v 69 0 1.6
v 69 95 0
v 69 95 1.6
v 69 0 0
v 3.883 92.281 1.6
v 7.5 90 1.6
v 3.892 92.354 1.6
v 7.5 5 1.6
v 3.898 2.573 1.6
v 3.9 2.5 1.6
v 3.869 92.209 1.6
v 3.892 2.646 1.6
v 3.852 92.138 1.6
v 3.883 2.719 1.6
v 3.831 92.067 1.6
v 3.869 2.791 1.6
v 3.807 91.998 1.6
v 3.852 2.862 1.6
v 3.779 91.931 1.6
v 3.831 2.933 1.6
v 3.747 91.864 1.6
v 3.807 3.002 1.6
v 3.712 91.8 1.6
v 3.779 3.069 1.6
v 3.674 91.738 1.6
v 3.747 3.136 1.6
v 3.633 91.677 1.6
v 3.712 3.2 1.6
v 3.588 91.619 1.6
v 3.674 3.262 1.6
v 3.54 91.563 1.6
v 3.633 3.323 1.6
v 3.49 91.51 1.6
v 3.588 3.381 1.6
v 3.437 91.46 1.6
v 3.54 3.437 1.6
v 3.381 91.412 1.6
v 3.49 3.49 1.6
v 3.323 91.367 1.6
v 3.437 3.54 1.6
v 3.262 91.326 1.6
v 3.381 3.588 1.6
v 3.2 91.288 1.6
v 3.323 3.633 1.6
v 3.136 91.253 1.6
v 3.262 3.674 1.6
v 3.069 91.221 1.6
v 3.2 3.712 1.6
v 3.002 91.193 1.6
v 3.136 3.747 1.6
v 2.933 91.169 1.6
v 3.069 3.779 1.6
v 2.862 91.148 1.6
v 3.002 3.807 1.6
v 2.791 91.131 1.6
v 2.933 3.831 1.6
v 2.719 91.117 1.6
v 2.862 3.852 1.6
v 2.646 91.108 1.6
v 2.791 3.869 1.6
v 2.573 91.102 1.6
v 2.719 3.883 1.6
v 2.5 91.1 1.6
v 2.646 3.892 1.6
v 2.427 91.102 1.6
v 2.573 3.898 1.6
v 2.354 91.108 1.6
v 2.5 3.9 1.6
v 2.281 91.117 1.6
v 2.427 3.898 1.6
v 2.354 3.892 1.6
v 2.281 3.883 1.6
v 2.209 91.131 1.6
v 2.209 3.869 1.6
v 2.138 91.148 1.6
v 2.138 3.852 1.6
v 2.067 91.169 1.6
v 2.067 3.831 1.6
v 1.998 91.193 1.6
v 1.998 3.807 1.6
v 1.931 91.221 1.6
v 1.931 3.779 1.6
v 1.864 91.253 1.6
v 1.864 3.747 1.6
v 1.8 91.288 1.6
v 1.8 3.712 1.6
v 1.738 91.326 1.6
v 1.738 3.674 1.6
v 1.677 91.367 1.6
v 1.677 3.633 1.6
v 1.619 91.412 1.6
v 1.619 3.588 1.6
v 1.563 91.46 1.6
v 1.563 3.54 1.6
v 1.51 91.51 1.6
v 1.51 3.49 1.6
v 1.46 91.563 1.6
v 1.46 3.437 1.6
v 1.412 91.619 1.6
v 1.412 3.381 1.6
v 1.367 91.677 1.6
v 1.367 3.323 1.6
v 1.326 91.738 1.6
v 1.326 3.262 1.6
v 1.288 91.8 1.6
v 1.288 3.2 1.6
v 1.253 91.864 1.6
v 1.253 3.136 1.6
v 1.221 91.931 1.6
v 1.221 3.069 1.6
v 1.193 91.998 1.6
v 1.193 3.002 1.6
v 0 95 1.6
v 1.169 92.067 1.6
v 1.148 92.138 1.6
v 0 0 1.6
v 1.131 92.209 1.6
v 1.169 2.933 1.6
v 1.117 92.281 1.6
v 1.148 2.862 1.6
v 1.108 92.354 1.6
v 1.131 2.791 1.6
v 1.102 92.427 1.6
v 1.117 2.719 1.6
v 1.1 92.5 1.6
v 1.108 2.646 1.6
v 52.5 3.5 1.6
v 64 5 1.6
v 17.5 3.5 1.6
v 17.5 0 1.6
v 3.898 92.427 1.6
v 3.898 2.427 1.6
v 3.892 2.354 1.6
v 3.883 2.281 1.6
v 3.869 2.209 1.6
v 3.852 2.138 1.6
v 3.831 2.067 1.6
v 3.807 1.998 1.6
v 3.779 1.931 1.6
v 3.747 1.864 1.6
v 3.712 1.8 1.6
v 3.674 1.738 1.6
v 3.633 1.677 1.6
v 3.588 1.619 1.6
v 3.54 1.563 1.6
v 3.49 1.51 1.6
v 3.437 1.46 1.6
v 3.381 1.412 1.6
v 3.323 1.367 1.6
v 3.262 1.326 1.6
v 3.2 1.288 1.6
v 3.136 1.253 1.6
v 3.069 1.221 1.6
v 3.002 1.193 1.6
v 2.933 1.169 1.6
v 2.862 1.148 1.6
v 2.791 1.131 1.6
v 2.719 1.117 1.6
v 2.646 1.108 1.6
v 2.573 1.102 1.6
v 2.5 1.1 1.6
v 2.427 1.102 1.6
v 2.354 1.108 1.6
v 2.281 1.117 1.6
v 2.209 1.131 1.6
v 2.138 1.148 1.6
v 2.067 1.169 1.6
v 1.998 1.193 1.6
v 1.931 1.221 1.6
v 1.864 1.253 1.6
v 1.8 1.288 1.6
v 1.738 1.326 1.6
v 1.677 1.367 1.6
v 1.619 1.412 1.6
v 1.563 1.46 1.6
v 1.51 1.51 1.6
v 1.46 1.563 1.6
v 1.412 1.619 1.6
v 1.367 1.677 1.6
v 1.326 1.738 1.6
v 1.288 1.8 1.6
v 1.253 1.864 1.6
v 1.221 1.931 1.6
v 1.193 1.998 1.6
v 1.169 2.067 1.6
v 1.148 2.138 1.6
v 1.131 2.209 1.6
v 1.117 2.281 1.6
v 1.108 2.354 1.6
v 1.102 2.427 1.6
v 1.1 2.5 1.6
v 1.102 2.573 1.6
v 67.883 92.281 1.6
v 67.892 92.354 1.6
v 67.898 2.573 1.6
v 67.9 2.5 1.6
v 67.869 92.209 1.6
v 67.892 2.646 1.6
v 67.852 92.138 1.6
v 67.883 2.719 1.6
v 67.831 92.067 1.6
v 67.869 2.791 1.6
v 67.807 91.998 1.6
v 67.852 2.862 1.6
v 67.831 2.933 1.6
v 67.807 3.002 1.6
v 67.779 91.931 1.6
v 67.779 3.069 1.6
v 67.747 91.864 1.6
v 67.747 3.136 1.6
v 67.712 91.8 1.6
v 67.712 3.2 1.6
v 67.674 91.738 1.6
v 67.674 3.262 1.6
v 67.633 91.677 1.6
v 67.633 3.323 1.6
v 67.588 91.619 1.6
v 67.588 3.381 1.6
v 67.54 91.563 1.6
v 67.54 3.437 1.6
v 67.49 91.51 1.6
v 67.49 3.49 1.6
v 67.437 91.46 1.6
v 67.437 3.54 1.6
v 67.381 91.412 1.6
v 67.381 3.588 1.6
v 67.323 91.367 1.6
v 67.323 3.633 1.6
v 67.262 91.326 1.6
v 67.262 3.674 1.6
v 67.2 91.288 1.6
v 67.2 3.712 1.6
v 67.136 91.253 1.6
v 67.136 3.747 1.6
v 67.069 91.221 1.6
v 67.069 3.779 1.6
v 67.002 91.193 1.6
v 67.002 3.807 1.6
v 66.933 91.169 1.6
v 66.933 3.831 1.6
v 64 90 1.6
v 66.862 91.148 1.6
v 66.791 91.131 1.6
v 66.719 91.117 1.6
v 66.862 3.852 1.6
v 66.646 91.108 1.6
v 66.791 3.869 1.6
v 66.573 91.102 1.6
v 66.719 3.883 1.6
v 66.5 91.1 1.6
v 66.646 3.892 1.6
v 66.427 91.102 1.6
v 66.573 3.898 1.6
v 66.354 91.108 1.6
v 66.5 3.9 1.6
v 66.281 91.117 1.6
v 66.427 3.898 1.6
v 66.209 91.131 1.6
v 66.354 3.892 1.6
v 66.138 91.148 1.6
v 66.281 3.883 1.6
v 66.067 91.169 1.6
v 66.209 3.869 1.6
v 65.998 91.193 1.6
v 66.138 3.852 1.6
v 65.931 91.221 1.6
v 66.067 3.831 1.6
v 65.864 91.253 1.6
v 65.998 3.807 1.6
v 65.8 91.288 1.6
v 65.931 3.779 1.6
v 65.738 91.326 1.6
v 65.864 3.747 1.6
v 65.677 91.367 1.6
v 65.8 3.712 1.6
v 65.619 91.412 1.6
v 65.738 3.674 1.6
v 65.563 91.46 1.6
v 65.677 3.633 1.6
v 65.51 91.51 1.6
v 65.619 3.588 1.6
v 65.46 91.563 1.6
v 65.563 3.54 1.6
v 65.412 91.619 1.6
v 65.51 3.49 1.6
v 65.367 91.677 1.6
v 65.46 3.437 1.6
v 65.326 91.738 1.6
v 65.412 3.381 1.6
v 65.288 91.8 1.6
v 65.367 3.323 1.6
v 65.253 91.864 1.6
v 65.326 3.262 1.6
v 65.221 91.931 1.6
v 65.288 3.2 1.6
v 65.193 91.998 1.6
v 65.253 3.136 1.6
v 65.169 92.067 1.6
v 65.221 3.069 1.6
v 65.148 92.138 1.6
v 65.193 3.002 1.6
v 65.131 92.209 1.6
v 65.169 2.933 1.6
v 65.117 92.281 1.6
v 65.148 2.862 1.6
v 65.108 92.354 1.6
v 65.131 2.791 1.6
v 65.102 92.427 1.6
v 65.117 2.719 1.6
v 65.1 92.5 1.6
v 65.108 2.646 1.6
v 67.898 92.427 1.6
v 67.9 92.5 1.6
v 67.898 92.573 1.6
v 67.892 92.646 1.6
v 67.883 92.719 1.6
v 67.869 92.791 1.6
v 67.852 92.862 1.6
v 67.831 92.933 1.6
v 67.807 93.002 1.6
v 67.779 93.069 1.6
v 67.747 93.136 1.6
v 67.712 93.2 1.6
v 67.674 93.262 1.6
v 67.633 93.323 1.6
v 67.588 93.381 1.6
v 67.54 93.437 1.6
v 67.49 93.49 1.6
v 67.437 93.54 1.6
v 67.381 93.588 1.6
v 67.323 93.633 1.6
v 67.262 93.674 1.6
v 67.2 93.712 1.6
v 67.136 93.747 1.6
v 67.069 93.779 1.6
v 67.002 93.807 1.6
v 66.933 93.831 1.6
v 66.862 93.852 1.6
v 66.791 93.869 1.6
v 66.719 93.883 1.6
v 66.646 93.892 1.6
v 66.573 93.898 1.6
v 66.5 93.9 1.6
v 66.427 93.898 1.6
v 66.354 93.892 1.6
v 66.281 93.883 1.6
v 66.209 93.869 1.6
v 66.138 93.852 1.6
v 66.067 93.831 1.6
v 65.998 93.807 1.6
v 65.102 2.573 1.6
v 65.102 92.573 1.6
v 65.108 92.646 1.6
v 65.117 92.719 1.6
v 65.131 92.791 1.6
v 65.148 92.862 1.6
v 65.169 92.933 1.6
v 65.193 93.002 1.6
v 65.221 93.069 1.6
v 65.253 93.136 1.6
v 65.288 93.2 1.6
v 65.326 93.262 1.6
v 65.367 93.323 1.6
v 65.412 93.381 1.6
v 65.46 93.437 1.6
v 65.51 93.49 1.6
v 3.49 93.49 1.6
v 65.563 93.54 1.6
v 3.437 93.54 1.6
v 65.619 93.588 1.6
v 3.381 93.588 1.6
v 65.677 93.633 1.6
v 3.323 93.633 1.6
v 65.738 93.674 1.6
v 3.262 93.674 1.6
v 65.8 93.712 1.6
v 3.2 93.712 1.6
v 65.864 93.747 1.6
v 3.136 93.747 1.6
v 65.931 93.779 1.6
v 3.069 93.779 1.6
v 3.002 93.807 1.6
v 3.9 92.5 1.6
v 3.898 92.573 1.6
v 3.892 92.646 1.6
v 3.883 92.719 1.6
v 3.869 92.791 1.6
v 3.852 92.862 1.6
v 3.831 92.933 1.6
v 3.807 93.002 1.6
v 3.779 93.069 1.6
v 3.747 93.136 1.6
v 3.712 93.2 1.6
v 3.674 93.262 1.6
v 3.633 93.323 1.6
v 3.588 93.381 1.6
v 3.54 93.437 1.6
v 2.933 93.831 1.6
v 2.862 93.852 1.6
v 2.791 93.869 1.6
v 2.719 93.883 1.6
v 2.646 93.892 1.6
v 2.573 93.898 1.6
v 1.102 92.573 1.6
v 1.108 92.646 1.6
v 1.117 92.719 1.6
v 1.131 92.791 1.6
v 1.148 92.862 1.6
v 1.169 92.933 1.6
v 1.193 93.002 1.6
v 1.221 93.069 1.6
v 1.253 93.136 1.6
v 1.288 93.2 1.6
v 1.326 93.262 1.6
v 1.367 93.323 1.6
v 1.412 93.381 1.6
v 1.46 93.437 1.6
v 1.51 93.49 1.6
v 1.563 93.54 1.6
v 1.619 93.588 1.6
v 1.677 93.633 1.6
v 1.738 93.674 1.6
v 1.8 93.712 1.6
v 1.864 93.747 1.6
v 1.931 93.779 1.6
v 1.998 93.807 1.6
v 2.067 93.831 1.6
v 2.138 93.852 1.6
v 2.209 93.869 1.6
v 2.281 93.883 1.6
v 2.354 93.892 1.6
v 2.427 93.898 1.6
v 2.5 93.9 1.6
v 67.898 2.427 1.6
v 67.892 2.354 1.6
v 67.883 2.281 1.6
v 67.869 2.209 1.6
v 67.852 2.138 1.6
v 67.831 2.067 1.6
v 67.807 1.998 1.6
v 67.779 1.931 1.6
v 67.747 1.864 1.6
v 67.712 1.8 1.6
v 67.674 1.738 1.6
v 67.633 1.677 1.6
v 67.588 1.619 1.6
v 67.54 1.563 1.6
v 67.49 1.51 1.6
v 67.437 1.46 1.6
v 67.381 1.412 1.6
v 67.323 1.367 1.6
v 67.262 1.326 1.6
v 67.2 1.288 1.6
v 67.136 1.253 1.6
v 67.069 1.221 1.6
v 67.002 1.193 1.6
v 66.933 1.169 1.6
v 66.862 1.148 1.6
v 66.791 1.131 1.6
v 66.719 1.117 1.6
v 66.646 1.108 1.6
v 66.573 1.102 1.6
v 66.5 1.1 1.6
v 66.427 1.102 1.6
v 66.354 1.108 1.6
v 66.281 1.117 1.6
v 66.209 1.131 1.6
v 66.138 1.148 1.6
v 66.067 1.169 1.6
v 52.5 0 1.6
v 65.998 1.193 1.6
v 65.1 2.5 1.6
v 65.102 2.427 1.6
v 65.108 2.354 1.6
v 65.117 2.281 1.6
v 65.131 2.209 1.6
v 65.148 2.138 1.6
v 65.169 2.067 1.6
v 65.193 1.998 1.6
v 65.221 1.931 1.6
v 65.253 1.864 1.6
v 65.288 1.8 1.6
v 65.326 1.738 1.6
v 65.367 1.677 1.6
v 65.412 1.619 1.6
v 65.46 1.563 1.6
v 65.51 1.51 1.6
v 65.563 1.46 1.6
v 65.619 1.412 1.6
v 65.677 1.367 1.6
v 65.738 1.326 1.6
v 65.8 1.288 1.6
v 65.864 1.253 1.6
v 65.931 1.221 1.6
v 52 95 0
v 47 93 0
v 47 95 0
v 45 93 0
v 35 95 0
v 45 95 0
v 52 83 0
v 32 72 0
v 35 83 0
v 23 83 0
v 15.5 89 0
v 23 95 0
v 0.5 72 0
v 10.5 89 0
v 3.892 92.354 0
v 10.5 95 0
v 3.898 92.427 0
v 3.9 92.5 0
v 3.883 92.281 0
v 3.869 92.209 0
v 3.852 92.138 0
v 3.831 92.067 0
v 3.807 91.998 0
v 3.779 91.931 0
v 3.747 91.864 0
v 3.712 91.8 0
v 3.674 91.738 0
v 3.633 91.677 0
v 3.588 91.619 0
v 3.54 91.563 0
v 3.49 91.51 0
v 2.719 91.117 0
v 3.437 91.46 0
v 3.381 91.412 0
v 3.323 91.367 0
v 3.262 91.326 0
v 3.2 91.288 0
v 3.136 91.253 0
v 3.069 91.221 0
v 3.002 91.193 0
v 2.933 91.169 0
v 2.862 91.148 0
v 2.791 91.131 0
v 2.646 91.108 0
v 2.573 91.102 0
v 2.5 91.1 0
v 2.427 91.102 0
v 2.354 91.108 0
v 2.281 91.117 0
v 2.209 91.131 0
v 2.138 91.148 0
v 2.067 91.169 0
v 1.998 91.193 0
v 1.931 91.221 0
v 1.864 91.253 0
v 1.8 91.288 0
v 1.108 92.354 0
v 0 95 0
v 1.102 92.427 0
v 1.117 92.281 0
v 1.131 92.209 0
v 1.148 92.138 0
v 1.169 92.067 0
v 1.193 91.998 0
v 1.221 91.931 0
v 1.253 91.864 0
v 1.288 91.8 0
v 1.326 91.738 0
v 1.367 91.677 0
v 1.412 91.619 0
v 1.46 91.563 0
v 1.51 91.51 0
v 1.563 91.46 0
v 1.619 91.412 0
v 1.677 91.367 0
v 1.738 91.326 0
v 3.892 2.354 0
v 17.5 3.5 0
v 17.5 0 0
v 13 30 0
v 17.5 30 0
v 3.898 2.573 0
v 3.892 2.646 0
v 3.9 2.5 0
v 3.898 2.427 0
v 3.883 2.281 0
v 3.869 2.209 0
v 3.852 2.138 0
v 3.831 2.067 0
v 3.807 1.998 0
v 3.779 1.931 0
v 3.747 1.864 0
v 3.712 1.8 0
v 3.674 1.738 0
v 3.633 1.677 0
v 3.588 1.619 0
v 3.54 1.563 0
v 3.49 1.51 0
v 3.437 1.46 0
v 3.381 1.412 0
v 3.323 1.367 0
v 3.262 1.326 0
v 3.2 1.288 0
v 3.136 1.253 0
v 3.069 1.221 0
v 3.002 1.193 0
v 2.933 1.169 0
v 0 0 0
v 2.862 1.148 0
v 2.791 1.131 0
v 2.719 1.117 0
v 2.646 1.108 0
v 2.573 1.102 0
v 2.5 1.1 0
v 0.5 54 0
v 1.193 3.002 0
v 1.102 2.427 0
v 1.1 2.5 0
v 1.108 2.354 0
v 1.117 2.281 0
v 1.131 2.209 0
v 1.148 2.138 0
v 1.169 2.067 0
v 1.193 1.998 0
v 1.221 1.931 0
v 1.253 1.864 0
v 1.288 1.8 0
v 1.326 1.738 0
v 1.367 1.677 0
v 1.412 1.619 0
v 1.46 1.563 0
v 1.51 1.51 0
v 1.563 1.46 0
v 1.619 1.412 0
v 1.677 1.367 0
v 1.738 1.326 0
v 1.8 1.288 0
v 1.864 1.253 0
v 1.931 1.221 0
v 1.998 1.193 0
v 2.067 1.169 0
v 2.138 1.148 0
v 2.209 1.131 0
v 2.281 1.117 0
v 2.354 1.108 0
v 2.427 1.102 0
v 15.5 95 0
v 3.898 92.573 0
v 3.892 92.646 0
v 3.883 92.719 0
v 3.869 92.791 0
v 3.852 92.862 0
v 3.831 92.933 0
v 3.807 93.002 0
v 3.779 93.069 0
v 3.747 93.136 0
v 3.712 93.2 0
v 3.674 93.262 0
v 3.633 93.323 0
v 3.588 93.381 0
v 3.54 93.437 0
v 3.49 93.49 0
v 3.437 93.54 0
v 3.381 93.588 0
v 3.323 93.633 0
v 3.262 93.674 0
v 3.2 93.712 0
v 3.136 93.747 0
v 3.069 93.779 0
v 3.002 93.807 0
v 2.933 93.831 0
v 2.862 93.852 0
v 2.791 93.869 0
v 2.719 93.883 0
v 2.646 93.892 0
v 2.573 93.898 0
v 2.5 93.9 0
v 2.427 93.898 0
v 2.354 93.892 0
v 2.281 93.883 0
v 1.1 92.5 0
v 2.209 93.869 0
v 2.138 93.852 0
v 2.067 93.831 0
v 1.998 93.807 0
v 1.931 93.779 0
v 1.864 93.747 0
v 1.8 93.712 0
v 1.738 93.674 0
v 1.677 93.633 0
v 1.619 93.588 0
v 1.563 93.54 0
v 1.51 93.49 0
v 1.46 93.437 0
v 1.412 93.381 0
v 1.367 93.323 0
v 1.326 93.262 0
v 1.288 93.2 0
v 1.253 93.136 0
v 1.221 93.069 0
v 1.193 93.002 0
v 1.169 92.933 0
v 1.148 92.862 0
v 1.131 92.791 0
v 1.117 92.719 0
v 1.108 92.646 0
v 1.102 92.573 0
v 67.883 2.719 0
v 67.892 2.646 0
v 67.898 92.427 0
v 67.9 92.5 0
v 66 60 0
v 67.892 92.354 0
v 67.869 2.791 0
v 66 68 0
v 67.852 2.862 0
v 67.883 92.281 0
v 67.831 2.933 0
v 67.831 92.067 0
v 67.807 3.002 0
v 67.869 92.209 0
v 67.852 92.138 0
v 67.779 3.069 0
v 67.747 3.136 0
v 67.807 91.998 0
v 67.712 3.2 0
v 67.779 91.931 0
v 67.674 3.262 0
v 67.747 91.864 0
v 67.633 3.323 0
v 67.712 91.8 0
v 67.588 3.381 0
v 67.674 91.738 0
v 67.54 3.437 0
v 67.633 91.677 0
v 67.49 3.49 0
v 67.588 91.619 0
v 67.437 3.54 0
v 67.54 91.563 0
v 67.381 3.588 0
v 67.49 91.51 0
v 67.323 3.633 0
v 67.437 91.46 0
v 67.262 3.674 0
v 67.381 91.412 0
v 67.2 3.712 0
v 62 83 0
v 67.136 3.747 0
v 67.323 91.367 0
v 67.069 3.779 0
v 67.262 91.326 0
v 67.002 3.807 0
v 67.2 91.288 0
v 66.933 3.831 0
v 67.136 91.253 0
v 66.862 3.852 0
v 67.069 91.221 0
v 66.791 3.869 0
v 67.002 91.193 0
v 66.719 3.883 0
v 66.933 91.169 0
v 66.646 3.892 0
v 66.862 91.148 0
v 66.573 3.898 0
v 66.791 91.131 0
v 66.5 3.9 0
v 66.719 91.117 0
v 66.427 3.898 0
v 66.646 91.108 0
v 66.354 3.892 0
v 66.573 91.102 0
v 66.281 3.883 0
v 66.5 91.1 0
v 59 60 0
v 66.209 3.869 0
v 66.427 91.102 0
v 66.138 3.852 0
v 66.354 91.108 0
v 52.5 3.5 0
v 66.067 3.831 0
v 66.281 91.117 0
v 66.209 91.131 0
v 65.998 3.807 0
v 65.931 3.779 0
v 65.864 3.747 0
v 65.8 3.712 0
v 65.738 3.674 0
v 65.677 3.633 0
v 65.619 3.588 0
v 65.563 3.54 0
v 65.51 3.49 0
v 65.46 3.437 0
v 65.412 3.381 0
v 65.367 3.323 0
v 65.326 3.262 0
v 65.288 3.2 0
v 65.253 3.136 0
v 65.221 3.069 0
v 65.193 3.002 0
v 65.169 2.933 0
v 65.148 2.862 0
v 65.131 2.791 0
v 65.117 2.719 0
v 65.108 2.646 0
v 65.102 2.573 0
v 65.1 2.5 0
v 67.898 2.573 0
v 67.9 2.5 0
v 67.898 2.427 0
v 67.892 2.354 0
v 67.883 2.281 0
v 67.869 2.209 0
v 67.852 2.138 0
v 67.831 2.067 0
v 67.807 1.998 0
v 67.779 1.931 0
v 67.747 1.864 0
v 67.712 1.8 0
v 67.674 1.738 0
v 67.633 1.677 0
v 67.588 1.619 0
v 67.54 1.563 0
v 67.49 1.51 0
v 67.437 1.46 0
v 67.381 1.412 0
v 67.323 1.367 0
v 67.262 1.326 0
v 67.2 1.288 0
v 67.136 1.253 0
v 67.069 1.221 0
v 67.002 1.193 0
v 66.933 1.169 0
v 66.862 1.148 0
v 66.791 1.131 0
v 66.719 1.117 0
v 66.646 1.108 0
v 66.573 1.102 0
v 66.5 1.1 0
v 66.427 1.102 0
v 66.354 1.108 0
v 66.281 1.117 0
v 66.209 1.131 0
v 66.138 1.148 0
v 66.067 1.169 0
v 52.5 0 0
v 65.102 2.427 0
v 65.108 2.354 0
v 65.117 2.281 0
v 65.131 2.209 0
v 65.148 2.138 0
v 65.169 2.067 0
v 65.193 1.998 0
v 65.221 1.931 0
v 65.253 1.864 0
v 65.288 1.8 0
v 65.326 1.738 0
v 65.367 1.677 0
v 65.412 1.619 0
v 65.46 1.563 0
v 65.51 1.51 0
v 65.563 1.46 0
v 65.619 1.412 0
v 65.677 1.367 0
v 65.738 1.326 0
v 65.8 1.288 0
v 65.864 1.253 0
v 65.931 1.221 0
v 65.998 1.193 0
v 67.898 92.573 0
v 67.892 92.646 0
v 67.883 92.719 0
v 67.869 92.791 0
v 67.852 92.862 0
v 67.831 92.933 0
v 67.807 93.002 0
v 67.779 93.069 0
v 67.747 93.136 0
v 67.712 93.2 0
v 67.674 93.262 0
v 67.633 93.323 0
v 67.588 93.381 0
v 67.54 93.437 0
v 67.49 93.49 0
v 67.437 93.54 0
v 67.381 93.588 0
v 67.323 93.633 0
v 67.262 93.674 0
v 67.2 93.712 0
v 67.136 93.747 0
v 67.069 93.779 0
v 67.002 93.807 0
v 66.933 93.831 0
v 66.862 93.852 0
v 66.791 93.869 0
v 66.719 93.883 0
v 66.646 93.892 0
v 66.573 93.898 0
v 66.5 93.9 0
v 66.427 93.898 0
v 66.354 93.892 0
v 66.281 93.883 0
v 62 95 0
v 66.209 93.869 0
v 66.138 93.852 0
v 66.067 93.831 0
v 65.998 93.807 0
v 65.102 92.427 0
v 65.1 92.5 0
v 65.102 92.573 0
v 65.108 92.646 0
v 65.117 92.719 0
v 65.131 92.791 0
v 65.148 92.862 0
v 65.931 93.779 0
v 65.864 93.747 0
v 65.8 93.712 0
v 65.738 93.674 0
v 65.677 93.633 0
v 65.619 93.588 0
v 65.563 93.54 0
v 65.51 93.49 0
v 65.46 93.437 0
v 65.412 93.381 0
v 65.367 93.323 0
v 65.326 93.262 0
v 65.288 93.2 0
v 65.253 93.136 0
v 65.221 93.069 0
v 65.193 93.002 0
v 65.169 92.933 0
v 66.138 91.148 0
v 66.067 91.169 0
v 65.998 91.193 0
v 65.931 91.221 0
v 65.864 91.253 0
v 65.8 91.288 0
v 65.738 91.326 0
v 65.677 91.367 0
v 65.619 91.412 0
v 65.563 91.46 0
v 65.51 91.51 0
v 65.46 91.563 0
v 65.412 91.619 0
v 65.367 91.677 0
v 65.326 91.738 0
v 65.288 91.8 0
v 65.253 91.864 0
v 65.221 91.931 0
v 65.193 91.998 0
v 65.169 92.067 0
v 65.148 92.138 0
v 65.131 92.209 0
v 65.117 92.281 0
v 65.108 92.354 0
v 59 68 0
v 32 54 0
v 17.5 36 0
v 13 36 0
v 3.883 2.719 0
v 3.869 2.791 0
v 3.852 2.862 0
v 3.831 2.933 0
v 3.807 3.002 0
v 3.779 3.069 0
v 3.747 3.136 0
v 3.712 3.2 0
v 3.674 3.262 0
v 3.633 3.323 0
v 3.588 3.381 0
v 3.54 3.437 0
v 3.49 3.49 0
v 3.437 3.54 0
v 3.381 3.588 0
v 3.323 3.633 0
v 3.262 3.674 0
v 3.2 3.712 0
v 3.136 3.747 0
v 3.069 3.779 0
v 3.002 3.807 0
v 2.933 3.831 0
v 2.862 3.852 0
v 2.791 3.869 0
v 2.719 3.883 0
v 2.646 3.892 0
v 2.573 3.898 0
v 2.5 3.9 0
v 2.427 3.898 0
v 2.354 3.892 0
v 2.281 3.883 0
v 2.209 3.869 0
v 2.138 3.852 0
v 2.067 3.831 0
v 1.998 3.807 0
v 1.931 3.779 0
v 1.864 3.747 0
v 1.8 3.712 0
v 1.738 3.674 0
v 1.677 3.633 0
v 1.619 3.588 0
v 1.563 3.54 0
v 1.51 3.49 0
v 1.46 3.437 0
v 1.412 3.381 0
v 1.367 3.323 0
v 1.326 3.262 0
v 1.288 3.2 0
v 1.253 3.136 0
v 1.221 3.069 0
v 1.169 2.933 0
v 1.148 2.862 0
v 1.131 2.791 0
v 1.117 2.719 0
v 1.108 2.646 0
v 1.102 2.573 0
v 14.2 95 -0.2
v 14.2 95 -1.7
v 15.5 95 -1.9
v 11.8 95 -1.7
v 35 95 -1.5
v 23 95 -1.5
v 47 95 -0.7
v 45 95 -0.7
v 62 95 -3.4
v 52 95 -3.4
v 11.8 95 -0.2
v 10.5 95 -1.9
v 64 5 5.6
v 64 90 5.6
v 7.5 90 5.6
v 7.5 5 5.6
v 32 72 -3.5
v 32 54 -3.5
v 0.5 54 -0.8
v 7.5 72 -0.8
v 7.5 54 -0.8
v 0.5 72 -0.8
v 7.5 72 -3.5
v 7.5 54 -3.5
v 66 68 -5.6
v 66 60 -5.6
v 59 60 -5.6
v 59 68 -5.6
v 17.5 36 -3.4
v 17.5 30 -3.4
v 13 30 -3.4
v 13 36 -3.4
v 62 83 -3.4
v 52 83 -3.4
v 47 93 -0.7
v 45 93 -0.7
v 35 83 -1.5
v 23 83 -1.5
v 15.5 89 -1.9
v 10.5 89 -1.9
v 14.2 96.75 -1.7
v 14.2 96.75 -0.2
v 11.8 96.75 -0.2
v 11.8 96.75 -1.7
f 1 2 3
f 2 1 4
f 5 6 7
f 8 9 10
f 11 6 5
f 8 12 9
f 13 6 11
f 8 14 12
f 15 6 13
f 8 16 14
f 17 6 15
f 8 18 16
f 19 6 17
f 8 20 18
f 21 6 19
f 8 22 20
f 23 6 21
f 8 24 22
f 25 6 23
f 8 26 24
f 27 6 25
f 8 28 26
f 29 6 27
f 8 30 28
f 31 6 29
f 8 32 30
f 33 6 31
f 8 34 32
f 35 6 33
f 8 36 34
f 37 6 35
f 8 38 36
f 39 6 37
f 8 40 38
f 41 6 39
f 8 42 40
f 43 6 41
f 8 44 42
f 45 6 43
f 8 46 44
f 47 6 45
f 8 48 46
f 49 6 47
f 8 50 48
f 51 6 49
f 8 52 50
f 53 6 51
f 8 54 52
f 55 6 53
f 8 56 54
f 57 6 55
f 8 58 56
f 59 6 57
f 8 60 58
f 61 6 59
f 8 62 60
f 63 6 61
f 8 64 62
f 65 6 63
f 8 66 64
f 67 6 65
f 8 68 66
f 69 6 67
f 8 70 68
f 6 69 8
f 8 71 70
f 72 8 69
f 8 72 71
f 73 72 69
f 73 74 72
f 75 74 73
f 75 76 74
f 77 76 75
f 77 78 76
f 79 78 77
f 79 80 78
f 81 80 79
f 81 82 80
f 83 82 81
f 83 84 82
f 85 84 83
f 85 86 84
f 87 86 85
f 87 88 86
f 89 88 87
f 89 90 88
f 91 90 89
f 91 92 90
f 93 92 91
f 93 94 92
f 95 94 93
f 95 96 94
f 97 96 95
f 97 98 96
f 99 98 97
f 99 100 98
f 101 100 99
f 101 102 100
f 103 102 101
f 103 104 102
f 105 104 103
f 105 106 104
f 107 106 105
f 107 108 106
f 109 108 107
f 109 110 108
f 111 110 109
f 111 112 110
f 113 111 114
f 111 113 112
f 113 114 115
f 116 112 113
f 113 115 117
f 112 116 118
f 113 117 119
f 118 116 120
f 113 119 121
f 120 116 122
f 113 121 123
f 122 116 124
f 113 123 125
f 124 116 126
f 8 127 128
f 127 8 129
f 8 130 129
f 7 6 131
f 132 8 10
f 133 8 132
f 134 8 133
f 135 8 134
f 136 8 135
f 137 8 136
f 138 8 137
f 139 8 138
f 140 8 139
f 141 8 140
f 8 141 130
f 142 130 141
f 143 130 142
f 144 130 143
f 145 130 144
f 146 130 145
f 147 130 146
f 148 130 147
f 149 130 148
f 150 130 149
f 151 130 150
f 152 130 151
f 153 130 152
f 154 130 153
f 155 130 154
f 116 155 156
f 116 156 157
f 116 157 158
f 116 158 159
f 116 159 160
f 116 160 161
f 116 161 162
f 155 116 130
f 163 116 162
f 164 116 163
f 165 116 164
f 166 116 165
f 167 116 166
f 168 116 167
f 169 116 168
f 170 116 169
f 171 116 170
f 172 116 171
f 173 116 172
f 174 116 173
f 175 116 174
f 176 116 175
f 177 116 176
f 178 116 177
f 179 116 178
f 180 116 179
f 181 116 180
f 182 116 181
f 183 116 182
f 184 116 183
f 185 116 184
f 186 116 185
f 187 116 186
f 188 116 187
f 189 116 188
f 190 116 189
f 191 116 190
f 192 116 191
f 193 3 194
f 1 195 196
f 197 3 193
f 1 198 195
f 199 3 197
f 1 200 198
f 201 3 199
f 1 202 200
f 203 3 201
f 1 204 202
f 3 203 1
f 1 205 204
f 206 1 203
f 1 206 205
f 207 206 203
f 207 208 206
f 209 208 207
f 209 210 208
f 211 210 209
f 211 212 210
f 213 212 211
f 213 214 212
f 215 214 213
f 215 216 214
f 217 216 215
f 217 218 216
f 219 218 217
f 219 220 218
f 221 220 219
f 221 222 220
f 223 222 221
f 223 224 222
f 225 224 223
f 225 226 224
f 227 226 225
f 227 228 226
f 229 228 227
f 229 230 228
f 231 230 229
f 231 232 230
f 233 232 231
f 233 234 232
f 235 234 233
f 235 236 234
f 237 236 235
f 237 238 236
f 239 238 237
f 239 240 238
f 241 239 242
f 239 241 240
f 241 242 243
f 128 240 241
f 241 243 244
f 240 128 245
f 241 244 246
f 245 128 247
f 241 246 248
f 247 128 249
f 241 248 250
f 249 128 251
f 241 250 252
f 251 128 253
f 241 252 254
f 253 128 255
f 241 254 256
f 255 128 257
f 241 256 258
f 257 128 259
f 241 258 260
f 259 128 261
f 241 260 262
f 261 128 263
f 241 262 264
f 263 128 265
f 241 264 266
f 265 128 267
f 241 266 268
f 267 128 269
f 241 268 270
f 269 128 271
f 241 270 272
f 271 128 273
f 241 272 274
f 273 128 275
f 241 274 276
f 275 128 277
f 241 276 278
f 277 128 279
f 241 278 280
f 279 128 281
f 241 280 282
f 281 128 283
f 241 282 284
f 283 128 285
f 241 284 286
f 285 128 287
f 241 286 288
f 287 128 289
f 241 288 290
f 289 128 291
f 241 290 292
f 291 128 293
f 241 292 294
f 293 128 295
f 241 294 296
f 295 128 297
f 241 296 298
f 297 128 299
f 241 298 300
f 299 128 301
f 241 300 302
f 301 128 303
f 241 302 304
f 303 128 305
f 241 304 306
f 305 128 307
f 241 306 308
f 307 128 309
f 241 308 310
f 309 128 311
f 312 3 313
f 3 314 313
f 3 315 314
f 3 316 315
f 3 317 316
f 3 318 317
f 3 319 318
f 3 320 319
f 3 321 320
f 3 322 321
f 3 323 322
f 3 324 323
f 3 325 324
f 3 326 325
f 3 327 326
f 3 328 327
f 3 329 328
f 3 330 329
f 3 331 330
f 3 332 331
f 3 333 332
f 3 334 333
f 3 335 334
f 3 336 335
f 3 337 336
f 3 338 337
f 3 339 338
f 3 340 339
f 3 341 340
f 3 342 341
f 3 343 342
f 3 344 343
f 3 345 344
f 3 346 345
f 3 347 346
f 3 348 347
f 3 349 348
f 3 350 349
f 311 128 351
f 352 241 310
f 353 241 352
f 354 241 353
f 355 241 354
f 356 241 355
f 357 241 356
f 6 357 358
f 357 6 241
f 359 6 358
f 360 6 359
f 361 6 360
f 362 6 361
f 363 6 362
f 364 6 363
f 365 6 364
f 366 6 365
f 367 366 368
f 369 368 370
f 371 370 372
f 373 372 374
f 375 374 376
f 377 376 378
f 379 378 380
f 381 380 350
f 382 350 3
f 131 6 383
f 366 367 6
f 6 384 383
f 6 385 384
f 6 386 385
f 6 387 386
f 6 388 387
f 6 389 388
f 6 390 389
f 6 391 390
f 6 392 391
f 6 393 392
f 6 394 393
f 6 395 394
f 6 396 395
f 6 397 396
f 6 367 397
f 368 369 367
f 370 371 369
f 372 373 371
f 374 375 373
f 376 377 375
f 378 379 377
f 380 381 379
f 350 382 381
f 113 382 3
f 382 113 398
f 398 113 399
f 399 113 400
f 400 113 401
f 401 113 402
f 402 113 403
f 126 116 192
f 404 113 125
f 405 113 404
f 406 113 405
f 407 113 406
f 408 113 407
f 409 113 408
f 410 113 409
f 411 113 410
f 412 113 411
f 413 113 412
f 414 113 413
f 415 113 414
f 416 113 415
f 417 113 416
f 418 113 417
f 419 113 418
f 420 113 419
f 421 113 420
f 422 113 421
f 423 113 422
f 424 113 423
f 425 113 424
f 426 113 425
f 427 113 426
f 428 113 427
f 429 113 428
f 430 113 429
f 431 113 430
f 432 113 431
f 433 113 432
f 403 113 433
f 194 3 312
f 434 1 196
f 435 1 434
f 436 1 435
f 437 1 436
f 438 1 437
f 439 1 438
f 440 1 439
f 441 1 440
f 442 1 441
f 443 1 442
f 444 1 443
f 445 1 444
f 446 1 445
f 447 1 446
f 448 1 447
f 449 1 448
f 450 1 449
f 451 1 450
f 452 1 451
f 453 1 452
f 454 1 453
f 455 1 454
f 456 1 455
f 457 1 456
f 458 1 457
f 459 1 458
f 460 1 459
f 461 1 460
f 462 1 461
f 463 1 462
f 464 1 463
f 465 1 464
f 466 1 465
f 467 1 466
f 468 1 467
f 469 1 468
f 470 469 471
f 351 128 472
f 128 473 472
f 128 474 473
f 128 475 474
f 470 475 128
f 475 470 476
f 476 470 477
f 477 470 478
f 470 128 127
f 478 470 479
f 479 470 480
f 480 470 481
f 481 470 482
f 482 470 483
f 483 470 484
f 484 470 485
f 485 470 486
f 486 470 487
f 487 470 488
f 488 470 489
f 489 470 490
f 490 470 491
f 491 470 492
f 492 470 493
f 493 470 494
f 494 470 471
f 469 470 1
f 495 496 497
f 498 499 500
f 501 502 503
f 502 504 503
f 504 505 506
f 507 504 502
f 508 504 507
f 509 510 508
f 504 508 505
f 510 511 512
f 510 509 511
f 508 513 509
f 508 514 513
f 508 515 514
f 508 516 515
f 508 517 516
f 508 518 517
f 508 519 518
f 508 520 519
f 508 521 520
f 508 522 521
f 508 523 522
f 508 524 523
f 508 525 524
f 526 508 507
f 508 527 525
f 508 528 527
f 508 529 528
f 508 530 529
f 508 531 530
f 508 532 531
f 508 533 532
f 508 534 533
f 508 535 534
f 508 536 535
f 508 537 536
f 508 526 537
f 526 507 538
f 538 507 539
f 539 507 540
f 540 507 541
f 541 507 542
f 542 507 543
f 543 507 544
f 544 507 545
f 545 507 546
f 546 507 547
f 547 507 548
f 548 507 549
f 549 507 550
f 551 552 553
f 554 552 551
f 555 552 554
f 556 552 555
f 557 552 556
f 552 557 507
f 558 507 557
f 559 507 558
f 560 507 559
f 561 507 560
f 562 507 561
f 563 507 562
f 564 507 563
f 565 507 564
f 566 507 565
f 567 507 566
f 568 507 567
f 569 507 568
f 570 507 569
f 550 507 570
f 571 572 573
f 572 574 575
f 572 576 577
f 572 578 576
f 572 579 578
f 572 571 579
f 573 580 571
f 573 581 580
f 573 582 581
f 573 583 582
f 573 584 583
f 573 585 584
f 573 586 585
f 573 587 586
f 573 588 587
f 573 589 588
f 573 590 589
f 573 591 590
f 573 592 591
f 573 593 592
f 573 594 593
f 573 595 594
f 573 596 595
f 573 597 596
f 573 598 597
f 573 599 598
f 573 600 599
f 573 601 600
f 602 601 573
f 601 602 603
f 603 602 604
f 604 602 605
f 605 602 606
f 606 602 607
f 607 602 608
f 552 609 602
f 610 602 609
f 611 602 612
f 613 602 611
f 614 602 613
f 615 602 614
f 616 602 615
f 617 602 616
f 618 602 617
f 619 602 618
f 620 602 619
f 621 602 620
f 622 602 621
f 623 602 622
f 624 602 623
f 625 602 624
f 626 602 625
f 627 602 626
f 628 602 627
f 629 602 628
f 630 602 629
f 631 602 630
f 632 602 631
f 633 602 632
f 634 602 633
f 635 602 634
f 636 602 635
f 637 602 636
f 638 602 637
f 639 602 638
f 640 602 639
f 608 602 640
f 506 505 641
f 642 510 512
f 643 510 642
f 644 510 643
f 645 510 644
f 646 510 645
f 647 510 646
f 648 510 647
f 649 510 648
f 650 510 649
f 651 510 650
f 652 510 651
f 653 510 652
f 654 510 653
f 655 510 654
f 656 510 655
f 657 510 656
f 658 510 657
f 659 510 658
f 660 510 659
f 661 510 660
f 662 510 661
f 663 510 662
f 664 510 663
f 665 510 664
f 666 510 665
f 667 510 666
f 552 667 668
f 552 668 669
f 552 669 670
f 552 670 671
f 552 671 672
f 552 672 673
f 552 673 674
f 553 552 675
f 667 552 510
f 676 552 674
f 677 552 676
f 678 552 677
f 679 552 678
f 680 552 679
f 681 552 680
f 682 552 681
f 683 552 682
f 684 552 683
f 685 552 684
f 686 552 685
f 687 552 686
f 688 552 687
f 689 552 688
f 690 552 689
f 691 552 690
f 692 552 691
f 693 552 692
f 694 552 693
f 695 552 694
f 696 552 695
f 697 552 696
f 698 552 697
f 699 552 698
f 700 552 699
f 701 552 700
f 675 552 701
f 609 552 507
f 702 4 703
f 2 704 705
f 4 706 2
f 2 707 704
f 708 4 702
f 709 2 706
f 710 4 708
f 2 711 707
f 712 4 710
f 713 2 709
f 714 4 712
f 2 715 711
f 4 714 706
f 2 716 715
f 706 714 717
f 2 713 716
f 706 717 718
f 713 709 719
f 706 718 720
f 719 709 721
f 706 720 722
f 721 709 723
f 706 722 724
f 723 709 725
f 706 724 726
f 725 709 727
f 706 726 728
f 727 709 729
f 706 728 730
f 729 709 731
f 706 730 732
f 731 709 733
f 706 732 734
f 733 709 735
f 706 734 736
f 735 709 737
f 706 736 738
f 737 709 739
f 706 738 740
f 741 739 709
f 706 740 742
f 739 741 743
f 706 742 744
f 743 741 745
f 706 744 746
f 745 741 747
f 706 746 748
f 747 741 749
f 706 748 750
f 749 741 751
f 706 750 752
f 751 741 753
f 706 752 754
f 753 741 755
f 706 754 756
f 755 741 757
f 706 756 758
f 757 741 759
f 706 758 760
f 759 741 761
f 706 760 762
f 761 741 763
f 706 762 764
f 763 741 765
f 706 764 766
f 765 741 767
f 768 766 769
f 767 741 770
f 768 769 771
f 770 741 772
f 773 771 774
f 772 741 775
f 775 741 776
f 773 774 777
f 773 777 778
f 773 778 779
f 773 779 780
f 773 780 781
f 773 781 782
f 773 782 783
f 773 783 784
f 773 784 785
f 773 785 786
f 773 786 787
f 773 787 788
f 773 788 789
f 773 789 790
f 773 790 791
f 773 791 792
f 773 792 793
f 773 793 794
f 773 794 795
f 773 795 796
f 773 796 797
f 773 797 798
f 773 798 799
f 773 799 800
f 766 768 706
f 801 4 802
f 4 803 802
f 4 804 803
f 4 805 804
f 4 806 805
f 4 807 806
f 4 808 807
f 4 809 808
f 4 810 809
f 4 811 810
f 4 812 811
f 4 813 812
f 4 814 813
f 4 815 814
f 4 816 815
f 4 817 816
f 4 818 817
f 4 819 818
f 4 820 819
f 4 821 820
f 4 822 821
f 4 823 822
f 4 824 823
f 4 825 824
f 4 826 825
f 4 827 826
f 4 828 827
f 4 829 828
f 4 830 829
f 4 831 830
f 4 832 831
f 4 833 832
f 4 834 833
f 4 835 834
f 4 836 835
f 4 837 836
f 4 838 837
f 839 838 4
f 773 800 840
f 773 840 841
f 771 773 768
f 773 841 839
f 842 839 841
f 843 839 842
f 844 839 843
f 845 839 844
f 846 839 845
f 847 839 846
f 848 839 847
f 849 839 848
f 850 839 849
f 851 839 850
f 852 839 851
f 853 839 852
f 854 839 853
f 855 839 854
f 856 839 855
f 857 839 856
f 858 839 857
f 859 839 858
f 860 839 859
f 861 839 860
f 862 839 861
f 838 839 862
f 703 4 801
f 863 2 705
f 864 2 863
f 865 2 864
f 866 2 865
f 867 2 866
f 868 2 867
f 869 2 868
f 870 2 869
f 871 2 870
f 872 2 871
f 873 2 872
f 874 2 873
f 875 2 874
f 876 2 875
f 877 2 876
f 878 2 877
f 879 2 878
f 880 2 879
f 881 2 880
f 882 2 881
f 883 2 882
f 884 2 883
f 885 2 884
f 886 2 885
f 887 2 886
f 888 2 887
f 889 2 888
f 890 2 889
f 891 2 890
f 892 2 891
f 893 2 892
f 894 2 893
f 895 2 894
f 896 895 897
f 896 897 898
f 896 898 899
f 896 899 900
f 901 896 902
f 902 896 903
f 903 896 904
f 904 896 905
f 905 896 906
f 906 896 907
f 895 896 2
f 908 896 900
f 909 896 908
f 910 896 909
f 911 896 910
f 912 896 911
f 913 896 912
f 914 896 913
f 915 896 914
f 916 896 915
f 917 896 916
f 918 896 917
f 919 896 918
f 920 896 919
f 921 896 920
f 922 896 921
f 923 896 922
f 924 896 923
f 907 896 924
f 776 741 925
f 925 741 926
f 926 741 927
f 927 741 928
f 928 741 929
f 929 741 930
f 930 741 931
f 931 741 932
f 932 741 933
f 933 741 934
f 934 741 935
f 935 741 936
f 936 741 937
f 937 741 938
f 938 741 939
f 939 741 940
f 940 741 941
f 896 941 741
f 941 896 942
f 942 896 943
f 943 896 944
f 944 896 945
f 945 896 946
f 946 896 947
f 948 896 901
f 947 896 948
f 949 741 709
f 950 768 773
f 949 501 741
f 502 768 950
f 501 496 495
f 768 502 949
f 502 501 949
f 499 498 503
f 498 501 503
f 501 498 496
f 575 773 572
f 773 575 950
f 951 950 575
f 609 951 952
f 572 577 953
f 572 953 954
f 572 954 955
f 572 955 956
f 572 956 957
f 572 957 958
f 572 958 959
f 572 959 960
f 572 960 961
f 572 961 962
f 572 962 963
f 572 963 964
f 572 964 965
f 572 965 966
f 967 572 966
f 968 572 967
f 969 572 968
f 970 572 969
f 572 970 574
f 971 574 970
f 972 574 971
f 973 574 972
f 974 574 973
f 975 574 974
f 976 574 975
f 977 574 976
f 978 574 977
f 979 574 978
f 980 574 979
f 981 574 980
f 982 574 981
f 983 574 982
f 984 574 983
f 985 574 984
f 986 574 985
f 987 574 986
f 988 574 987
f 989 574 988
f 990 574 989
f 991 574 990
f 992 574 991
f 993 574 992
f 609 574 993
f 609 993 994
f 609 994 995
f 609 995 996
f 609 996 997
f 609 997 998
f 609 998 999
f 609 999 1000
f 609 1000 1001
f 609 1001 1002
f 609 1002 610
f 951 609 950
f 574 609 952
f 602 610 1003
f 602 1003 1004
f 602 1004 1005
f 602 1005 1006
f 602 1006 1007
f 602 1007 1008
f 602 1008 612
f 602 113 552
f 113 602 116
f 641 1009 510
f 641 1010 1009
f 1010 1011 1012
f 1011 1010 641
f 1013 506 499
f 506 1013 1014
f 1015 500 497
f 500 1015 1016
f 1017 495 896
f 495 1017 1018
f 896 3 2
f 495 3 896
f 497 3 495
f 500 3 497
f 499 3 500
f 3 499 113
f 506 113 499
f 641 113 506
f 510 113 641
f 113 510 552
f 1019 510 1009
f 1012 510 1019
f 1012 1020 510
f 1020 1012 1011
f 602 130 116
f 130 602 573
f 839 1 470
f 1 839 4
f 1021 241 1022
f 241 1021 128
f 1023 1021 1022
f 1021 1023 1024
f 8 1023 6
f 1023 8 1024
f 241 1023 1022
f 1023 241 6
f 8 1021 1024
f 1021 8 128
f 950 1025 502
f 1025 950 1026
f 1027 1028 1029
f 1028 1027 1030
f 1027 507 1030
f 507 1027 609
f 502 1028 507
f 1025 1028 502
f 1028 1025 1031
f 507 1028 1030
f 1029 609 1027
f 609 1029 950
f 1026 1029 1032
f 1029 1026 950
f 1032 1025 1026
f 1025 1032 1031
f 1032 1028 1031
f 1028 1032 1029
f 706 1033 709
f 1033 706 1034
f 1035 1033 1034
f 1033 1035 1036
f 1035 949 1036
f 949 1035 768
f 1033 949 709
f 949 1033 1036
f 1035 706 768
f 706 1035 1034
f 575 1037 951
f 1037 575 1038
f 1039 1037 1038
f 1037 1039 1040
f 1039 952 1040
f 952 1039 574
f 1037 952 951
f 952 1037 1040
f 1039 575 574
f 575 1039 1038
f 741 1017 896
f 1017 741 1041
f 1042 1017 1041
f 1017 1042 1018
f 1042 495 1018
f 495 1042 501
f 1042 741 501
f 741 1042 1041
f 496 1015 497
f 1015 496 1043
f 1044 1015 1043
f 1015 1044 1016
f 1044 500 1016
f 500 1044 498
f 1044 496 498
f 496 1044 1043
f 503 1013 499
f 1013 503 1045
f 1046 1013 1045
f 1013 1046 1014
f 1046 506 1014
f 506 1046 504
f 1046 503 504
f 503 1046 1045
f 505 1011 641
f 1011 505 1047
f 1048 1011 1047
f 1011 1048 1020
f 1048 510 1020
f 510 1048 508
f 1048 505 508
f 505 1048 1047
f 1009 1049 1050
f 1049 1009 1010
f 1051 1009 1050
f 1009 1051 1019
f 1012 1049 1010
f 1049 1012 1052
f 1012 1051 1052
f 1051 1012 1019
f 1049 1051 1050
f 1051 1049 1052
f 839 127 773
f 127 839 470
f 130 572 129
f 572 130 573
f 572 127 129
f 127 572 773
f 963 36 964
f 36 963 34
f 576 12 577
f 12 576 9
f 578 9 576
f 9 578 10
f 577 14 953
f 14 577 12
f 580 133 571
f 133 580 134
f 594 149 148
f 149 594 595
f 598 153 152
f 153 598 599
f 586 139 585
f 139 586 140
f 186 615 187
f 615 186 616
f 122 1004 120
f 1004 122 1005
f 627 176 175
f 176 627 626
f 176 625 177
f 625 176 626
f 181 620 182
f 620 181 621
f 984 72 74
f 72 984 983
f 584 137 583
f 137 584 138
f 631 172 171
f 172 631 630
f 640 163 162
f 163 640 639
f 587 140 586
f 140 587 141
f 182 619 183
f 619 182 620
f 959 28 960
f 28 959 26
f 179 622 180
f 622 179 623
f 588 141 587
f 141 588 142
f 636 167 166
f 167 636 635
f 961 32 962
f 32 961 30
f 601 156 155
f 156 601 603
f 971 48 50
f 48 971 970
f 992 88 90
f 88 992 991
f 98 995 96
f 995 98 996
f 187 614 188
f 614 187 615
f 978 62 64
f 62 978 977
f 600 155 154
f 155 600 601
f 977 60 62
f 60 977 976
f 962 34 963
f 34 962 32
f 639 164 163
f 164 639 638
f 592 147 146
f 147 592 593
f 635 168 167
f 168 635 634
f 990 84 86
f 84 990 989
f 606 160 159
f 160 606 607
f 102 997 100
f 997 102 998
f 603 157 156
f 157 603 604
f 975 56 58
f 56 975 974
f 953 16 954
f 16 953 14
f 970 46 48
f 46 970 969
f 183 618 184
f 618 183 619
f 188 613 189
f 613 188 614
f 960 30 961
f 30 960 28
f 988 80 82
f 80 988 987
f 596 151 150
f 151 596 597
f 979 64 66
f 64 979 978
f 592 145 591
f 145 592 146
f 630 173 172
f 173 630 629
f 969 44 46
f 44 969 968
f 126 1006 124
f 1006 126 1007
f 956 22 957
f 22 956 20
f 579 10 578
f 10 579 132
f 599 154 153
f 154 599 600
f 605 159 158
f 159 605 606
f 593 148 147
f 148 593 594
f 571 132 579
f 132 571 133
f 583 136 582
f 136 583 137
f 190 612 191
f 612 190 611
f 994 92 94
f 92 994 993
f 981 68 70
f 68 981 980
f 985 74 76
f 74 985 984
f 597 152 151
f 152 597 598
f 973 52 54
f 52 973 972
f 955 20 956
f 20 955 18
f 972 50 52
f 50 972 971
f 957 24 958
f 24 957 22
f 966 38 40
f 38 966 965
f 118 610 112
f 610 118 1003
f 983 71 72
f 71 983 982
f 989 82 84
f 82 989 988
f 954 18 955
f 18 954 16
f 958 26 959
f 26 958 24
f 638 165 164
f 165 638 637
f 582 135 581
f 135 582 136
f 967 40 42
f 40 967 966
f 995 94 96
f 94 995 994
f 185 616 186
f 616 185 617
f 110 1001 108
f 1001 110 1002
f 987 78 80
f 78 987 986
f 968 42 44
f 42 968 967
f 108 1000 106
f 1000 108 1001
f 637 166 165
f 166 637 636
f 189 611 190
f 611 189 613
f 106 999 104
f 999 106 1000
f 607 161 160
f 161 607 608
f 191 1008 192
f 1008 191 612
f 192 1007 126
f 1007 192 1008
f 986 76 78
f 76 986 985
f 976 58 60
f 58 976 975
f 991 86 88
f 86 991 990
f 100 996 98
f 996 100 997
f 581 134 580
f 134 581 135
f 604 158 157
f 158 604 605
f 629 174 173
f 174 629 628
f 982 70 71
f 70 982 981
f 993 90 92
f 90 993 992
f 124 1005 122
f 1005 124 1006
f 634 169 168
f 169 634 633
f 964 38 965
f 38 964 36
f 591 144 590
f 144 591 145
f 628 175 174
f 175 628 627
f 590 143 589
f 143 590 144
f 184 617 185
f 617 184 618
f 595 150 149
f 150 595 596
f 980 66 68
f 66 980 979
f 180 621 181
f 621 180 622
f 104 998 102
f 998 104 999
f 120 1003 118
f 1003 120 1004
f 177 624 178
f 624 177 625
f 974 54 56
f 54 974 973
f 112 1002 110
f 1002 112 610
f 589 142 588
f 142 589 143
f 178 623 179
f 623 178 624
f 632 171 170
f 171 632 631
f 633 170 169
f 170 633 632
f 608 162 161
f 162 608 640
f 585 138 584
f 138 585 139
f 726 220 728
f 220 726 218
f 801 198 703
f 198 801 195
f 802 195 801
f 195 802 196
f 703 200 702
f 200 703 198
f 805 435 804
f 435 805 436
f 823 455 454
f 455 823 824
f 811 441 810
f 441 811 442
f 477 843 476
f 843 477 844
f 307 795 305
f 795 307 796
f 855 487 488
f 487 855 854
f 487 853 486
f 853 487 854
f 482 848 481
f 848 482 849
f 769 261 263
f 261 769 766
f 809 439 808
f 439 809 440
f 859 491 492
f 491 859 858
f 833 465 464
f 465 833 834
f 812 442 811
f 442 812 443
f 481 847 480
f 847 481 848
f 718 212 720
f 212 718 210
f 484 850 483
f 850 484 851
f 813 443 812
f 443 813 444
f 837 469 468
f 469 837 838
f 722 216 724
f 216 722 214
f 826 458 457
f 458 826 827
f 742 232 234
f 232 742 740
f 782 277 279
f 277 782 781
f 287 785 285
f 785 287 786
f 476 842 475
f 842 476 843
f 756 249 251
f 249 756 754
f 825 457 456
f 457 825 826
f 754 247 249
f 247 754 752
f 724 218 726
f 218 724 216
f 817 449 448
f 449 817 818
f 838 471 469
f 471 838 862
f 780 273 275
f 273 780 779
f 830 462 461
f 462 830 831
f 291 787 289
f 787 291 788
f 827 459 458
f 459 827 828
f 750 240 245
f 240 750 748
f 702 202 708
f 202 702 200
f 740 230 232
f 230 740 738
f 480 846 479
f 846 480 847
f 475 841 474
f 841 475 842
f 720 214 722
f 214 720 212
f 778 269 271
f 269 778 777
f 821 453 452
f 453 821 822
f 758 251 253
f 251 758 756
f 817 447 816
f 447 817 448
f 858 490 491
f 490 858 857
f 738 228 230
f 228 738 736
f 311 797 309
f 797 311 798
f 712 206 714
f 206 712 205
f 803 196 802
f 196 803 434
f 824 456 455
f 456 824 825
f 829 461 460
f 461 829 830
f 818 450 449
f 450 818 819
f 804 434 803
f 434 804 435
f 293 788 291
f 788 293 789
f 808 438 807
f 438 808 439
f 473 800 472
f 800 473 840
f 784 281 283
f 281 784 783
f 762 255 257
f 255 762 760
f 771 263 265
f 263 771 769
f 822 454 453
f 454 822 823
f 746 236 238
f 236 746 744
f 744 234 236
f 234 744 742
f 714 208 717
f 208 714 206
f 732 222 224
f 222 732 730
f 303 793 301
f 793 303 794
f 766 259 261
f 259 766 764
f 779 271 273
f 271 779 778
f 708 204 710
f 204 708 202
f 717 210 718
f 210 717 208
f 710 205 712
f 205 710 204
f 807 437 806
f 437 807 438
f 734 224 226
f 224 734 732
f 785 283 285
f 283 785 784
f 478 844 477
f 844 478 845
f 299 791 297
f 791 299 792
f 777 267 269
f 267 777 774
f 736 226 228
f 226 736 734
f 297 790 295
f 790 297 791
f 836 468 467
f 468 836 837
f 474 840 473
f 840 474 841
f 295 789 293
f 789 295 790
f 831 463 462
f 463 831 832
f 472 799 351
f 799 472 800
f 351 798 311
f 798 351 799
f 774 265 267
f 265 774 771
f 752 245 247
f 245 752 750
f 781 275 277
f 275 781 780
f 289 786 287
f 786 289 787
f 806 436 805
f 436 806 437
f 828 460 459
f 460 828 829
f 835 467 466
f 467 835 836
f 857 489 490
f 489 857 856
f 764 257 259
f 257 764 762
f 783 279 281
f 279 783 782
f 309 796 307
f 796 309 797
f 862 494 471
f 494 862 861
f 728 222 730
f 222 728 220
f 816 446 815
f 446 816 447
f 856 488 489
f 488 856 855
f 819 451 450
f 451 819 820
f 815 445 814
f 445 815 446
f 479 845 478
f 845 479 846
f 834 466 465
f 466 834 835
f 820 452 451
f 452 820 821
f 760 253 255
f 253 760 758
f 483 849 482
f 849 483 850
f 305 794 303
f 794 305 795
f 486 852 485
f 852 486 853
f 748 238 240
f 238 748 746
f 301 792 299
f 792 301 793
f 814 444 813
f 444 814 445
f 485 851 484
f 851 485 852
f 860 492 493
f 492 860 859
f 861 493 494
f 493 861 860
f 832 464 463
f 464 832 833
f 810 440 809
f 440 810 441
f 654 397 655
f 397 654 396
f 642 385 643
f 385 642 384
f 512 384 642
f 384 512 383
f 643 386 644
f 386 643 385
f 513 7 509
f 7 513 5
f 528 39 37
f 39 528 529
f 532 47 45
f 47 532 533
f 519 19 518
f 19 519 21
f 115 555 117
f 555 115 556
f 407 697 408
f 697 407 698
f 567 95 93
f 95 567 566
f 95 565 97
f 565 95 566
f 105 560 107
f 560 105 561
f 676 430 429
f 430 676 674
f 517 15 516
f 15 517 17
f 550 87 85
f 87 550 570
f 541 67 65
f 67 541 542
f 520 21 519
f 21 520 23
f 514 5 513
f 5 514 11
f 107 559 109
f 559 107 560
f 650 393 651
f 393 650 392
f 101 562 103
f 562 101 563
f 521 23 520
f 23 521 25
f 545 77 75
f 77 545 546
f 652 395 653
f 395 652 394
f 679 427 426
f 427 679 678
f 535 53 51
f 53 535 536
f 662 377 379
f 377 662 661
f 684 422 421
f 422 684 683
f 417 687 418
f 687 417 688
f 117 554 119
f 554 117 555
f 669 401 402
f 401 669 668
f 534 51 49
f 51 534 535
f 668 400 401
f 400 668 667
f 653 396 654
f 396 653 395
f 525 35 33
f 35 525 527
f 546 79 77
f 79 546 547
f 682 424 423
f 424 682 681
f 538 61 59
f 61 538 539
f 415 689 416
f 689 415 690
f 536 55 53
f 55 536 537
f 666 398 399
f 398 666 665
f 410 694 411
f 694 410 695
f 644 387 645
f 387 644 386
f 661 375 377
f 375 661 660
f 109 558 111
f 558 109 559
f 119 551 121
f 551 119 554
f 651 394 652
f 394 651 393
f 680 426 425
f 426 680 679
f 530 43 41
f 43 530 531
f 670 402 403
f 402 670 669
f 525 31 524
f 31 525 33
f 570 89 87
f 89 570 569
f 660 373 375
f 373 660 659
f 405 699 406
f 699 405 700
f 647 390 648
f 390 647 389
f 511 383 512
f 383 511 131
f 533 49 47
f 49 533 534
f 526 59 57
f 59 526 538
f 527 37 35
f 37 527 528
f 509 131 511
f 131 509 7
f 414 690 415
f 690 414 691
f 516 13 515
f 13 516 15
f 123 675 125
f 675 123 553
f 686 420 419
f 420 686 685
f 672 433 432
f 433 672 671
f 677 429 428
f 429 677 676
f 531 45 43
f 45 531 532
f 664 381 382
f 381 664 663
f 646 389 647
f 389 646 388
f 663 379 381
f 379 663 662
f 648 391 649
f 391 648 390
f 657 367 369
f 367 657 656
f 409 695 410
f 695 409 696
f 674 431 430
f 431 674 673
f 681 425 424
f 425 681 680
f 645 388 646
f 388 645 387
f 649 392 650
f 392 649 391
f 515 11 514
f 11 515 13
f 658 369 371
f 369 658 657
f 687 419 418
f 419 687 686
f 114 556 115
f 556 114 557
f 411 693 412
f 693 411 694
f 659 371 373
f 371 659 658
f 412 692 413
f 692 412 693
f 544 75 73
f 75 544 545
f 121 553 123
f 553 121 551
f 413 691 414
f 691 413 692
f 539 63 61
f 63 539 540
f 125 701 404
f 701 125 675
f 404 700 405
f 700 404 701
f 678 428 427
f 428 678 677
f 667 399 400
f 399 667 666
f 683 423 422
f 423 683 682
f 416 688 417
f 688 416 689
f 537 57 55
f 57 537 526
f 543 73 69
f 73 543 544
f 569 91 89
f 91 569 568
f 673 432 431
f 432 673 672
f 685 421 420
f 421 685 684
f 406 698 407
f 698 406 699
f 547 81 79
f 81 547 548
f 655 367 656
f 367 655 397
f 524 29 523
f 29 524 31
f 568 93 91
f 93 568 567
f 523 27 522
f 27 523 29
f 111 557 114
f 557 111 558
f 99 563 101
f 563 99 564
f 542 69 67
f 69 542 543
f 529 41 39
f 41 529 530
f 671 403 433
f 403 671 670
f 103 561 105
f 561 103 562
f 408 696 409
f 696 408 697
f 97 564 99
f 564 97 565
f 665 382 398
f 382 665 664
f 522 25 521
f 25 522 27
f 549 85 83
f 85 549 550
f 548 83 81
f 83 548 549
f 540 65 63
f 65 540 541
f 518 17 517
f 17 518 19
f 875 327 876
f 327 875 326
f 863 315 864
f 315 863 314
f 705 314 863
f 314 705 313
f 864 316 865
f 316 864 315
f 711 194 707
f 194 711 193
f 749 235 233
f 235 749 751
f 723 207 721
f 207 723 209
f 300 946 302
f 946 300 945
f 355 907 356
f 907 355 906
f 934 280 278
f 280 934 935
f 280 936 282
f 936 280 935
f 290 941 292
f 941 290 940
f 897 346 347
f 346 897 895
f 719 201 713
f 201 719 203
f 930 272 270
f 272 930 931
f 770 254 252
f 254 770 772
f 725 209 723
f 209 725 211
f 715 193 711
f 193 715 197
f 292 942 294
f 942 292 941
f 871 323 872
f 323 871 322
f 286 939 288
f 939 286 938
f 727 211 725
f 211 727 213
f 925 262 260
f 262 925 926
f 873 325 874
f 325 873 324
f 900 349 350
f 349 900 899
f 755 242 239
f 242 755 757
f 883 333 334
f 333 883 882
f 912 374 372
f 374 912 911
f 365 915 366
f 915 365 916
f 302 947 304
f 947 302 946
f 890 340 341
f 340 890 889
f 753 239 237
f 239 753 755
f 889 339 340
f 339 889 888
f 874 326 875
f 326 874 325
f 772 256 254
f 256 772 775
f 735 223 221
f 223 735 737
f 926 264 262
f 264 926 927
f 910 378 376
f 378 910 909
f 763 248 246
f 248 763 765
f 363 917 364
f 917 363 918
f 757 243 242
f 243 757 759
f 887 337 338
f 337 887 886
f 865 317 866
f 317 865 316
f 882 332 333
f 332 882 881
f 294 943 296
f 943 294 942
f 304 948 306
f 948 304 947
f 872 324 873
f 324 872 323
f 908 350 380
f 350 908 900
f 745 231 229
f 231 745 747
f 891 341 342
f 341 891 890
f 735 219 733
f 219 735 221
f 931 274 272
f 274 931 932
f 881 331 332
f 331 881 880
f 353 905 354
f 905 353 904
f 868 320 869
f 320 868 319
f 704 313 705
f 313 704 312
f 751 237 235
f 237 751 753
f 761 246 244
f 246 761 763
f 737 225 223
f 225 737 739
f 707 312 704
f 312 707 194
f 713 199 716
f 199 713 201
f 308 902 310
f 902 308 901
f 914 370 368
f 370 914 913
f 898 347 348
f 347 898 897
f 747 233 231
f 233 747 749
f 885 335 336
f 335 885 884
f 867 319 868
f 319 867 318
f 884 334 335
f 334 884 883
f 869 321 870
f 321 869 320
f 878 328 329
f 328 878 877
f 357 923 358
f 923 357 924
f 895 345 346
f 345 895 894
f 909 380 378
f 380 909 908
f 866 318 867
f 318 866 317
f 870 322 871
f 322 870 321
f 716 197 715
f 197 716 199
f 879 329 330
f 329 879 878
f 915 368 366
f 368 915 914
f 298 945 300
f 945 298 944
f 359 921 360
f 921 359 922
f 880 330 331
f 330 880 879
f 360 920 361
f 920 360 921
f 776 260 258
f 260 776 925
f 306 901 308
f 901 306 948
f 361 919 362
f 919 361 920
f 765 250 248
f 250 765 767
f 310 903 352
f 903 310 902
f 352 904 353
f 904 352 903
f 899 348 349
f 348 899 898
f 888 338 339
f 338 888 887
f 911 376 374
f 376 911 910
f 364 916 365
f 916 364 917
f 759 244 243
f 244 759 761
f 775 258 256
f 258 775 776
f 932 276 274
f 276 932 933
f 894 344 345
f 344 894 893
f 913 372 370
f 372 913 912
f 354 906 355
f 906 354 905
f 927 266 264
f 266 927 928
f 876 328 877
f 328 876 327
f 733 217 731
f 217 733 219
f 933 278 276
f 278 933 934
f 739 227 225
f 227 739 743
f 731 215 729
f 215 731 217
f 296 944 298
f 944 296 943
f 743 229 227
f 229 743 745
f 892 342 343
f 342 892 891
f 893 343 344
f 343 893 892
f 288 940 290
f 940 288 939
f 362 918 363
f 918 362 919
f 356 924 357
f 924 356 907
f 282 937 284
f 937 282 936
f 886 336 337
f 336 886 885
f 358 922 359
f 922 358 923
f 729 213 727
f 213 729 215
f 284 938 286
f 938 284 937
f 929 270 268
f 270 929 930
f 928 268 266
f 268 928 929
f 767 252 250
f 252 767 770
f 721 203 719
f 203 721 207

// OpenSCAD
//
// gCore board outline with LCD
//

module gCore() {
    difference() {
        union() {
            // PCB
            cube([69, 95, 1.6]);
        
            // LCD Module
            translate([7.5, 5, 1.6]) {
                cube([56.5, 85, 4]);
            }
            
            // ESP32
            translate([0.5, 54, -0.8]) {
                cube([31.5, 18, 0.8]);
            }
            translate([7.5, 54, -3.5]) {
                cube([24.5, 18, 3.5]);
            }
            
            // Battery connector (highest item on bottom)
            translate([59, 60, -5.6]) {
                cube([7, 8, 5.6]);
            }
            
            // Qwiic connector
            translate([13, 30, -3.4]) {
                cube([4.5, 6, 3.4]);
            }
            
            // USB Connector
            translate([52, 83, -3.4]) {
                cube([10, 12, 3.4]);
            }
            
            // Charge LED
            translate([45, 93, -0.7]) {
                cube([2, 2, 0.7]);
            }
            
            // Micro-SD socket
            translate([23, 83, -1.5]) {
                cube([12, 12, 1.5]);
            }
            
            // Power button
            translate([10.5, 89, -1.9]) {
                cube([5, 6, 1.9]);
            }
            translate([11.8, 95, -1.7]) {
                cube([2.4, 1.75, 1.5]);
            }
        }
        
        // LCD cable PCB cut-out
        translate([17.5, -1, -1]) {
            cube([35, 4.5, 3.6]);
        }
        
        // Mounting holes
        translate([2.5, 2.5, -1]) {
            cylinder(h=3.6, r=1.4, $fn=120);
        }
        translate([66.5, 2.5, -1]) {
            cylinder(h=3.6, r=1.4, $fn=120);
        }
        translate([2.5, 92.5, -1]) {
            cylinder(h=3.6, r=1.4, $fn=120);
        }
        translate([66.5, 92.5, -1]) {
            cylinder(h=3.6, r=1.4, $fn=120);
        }
    }
}


gCore();
